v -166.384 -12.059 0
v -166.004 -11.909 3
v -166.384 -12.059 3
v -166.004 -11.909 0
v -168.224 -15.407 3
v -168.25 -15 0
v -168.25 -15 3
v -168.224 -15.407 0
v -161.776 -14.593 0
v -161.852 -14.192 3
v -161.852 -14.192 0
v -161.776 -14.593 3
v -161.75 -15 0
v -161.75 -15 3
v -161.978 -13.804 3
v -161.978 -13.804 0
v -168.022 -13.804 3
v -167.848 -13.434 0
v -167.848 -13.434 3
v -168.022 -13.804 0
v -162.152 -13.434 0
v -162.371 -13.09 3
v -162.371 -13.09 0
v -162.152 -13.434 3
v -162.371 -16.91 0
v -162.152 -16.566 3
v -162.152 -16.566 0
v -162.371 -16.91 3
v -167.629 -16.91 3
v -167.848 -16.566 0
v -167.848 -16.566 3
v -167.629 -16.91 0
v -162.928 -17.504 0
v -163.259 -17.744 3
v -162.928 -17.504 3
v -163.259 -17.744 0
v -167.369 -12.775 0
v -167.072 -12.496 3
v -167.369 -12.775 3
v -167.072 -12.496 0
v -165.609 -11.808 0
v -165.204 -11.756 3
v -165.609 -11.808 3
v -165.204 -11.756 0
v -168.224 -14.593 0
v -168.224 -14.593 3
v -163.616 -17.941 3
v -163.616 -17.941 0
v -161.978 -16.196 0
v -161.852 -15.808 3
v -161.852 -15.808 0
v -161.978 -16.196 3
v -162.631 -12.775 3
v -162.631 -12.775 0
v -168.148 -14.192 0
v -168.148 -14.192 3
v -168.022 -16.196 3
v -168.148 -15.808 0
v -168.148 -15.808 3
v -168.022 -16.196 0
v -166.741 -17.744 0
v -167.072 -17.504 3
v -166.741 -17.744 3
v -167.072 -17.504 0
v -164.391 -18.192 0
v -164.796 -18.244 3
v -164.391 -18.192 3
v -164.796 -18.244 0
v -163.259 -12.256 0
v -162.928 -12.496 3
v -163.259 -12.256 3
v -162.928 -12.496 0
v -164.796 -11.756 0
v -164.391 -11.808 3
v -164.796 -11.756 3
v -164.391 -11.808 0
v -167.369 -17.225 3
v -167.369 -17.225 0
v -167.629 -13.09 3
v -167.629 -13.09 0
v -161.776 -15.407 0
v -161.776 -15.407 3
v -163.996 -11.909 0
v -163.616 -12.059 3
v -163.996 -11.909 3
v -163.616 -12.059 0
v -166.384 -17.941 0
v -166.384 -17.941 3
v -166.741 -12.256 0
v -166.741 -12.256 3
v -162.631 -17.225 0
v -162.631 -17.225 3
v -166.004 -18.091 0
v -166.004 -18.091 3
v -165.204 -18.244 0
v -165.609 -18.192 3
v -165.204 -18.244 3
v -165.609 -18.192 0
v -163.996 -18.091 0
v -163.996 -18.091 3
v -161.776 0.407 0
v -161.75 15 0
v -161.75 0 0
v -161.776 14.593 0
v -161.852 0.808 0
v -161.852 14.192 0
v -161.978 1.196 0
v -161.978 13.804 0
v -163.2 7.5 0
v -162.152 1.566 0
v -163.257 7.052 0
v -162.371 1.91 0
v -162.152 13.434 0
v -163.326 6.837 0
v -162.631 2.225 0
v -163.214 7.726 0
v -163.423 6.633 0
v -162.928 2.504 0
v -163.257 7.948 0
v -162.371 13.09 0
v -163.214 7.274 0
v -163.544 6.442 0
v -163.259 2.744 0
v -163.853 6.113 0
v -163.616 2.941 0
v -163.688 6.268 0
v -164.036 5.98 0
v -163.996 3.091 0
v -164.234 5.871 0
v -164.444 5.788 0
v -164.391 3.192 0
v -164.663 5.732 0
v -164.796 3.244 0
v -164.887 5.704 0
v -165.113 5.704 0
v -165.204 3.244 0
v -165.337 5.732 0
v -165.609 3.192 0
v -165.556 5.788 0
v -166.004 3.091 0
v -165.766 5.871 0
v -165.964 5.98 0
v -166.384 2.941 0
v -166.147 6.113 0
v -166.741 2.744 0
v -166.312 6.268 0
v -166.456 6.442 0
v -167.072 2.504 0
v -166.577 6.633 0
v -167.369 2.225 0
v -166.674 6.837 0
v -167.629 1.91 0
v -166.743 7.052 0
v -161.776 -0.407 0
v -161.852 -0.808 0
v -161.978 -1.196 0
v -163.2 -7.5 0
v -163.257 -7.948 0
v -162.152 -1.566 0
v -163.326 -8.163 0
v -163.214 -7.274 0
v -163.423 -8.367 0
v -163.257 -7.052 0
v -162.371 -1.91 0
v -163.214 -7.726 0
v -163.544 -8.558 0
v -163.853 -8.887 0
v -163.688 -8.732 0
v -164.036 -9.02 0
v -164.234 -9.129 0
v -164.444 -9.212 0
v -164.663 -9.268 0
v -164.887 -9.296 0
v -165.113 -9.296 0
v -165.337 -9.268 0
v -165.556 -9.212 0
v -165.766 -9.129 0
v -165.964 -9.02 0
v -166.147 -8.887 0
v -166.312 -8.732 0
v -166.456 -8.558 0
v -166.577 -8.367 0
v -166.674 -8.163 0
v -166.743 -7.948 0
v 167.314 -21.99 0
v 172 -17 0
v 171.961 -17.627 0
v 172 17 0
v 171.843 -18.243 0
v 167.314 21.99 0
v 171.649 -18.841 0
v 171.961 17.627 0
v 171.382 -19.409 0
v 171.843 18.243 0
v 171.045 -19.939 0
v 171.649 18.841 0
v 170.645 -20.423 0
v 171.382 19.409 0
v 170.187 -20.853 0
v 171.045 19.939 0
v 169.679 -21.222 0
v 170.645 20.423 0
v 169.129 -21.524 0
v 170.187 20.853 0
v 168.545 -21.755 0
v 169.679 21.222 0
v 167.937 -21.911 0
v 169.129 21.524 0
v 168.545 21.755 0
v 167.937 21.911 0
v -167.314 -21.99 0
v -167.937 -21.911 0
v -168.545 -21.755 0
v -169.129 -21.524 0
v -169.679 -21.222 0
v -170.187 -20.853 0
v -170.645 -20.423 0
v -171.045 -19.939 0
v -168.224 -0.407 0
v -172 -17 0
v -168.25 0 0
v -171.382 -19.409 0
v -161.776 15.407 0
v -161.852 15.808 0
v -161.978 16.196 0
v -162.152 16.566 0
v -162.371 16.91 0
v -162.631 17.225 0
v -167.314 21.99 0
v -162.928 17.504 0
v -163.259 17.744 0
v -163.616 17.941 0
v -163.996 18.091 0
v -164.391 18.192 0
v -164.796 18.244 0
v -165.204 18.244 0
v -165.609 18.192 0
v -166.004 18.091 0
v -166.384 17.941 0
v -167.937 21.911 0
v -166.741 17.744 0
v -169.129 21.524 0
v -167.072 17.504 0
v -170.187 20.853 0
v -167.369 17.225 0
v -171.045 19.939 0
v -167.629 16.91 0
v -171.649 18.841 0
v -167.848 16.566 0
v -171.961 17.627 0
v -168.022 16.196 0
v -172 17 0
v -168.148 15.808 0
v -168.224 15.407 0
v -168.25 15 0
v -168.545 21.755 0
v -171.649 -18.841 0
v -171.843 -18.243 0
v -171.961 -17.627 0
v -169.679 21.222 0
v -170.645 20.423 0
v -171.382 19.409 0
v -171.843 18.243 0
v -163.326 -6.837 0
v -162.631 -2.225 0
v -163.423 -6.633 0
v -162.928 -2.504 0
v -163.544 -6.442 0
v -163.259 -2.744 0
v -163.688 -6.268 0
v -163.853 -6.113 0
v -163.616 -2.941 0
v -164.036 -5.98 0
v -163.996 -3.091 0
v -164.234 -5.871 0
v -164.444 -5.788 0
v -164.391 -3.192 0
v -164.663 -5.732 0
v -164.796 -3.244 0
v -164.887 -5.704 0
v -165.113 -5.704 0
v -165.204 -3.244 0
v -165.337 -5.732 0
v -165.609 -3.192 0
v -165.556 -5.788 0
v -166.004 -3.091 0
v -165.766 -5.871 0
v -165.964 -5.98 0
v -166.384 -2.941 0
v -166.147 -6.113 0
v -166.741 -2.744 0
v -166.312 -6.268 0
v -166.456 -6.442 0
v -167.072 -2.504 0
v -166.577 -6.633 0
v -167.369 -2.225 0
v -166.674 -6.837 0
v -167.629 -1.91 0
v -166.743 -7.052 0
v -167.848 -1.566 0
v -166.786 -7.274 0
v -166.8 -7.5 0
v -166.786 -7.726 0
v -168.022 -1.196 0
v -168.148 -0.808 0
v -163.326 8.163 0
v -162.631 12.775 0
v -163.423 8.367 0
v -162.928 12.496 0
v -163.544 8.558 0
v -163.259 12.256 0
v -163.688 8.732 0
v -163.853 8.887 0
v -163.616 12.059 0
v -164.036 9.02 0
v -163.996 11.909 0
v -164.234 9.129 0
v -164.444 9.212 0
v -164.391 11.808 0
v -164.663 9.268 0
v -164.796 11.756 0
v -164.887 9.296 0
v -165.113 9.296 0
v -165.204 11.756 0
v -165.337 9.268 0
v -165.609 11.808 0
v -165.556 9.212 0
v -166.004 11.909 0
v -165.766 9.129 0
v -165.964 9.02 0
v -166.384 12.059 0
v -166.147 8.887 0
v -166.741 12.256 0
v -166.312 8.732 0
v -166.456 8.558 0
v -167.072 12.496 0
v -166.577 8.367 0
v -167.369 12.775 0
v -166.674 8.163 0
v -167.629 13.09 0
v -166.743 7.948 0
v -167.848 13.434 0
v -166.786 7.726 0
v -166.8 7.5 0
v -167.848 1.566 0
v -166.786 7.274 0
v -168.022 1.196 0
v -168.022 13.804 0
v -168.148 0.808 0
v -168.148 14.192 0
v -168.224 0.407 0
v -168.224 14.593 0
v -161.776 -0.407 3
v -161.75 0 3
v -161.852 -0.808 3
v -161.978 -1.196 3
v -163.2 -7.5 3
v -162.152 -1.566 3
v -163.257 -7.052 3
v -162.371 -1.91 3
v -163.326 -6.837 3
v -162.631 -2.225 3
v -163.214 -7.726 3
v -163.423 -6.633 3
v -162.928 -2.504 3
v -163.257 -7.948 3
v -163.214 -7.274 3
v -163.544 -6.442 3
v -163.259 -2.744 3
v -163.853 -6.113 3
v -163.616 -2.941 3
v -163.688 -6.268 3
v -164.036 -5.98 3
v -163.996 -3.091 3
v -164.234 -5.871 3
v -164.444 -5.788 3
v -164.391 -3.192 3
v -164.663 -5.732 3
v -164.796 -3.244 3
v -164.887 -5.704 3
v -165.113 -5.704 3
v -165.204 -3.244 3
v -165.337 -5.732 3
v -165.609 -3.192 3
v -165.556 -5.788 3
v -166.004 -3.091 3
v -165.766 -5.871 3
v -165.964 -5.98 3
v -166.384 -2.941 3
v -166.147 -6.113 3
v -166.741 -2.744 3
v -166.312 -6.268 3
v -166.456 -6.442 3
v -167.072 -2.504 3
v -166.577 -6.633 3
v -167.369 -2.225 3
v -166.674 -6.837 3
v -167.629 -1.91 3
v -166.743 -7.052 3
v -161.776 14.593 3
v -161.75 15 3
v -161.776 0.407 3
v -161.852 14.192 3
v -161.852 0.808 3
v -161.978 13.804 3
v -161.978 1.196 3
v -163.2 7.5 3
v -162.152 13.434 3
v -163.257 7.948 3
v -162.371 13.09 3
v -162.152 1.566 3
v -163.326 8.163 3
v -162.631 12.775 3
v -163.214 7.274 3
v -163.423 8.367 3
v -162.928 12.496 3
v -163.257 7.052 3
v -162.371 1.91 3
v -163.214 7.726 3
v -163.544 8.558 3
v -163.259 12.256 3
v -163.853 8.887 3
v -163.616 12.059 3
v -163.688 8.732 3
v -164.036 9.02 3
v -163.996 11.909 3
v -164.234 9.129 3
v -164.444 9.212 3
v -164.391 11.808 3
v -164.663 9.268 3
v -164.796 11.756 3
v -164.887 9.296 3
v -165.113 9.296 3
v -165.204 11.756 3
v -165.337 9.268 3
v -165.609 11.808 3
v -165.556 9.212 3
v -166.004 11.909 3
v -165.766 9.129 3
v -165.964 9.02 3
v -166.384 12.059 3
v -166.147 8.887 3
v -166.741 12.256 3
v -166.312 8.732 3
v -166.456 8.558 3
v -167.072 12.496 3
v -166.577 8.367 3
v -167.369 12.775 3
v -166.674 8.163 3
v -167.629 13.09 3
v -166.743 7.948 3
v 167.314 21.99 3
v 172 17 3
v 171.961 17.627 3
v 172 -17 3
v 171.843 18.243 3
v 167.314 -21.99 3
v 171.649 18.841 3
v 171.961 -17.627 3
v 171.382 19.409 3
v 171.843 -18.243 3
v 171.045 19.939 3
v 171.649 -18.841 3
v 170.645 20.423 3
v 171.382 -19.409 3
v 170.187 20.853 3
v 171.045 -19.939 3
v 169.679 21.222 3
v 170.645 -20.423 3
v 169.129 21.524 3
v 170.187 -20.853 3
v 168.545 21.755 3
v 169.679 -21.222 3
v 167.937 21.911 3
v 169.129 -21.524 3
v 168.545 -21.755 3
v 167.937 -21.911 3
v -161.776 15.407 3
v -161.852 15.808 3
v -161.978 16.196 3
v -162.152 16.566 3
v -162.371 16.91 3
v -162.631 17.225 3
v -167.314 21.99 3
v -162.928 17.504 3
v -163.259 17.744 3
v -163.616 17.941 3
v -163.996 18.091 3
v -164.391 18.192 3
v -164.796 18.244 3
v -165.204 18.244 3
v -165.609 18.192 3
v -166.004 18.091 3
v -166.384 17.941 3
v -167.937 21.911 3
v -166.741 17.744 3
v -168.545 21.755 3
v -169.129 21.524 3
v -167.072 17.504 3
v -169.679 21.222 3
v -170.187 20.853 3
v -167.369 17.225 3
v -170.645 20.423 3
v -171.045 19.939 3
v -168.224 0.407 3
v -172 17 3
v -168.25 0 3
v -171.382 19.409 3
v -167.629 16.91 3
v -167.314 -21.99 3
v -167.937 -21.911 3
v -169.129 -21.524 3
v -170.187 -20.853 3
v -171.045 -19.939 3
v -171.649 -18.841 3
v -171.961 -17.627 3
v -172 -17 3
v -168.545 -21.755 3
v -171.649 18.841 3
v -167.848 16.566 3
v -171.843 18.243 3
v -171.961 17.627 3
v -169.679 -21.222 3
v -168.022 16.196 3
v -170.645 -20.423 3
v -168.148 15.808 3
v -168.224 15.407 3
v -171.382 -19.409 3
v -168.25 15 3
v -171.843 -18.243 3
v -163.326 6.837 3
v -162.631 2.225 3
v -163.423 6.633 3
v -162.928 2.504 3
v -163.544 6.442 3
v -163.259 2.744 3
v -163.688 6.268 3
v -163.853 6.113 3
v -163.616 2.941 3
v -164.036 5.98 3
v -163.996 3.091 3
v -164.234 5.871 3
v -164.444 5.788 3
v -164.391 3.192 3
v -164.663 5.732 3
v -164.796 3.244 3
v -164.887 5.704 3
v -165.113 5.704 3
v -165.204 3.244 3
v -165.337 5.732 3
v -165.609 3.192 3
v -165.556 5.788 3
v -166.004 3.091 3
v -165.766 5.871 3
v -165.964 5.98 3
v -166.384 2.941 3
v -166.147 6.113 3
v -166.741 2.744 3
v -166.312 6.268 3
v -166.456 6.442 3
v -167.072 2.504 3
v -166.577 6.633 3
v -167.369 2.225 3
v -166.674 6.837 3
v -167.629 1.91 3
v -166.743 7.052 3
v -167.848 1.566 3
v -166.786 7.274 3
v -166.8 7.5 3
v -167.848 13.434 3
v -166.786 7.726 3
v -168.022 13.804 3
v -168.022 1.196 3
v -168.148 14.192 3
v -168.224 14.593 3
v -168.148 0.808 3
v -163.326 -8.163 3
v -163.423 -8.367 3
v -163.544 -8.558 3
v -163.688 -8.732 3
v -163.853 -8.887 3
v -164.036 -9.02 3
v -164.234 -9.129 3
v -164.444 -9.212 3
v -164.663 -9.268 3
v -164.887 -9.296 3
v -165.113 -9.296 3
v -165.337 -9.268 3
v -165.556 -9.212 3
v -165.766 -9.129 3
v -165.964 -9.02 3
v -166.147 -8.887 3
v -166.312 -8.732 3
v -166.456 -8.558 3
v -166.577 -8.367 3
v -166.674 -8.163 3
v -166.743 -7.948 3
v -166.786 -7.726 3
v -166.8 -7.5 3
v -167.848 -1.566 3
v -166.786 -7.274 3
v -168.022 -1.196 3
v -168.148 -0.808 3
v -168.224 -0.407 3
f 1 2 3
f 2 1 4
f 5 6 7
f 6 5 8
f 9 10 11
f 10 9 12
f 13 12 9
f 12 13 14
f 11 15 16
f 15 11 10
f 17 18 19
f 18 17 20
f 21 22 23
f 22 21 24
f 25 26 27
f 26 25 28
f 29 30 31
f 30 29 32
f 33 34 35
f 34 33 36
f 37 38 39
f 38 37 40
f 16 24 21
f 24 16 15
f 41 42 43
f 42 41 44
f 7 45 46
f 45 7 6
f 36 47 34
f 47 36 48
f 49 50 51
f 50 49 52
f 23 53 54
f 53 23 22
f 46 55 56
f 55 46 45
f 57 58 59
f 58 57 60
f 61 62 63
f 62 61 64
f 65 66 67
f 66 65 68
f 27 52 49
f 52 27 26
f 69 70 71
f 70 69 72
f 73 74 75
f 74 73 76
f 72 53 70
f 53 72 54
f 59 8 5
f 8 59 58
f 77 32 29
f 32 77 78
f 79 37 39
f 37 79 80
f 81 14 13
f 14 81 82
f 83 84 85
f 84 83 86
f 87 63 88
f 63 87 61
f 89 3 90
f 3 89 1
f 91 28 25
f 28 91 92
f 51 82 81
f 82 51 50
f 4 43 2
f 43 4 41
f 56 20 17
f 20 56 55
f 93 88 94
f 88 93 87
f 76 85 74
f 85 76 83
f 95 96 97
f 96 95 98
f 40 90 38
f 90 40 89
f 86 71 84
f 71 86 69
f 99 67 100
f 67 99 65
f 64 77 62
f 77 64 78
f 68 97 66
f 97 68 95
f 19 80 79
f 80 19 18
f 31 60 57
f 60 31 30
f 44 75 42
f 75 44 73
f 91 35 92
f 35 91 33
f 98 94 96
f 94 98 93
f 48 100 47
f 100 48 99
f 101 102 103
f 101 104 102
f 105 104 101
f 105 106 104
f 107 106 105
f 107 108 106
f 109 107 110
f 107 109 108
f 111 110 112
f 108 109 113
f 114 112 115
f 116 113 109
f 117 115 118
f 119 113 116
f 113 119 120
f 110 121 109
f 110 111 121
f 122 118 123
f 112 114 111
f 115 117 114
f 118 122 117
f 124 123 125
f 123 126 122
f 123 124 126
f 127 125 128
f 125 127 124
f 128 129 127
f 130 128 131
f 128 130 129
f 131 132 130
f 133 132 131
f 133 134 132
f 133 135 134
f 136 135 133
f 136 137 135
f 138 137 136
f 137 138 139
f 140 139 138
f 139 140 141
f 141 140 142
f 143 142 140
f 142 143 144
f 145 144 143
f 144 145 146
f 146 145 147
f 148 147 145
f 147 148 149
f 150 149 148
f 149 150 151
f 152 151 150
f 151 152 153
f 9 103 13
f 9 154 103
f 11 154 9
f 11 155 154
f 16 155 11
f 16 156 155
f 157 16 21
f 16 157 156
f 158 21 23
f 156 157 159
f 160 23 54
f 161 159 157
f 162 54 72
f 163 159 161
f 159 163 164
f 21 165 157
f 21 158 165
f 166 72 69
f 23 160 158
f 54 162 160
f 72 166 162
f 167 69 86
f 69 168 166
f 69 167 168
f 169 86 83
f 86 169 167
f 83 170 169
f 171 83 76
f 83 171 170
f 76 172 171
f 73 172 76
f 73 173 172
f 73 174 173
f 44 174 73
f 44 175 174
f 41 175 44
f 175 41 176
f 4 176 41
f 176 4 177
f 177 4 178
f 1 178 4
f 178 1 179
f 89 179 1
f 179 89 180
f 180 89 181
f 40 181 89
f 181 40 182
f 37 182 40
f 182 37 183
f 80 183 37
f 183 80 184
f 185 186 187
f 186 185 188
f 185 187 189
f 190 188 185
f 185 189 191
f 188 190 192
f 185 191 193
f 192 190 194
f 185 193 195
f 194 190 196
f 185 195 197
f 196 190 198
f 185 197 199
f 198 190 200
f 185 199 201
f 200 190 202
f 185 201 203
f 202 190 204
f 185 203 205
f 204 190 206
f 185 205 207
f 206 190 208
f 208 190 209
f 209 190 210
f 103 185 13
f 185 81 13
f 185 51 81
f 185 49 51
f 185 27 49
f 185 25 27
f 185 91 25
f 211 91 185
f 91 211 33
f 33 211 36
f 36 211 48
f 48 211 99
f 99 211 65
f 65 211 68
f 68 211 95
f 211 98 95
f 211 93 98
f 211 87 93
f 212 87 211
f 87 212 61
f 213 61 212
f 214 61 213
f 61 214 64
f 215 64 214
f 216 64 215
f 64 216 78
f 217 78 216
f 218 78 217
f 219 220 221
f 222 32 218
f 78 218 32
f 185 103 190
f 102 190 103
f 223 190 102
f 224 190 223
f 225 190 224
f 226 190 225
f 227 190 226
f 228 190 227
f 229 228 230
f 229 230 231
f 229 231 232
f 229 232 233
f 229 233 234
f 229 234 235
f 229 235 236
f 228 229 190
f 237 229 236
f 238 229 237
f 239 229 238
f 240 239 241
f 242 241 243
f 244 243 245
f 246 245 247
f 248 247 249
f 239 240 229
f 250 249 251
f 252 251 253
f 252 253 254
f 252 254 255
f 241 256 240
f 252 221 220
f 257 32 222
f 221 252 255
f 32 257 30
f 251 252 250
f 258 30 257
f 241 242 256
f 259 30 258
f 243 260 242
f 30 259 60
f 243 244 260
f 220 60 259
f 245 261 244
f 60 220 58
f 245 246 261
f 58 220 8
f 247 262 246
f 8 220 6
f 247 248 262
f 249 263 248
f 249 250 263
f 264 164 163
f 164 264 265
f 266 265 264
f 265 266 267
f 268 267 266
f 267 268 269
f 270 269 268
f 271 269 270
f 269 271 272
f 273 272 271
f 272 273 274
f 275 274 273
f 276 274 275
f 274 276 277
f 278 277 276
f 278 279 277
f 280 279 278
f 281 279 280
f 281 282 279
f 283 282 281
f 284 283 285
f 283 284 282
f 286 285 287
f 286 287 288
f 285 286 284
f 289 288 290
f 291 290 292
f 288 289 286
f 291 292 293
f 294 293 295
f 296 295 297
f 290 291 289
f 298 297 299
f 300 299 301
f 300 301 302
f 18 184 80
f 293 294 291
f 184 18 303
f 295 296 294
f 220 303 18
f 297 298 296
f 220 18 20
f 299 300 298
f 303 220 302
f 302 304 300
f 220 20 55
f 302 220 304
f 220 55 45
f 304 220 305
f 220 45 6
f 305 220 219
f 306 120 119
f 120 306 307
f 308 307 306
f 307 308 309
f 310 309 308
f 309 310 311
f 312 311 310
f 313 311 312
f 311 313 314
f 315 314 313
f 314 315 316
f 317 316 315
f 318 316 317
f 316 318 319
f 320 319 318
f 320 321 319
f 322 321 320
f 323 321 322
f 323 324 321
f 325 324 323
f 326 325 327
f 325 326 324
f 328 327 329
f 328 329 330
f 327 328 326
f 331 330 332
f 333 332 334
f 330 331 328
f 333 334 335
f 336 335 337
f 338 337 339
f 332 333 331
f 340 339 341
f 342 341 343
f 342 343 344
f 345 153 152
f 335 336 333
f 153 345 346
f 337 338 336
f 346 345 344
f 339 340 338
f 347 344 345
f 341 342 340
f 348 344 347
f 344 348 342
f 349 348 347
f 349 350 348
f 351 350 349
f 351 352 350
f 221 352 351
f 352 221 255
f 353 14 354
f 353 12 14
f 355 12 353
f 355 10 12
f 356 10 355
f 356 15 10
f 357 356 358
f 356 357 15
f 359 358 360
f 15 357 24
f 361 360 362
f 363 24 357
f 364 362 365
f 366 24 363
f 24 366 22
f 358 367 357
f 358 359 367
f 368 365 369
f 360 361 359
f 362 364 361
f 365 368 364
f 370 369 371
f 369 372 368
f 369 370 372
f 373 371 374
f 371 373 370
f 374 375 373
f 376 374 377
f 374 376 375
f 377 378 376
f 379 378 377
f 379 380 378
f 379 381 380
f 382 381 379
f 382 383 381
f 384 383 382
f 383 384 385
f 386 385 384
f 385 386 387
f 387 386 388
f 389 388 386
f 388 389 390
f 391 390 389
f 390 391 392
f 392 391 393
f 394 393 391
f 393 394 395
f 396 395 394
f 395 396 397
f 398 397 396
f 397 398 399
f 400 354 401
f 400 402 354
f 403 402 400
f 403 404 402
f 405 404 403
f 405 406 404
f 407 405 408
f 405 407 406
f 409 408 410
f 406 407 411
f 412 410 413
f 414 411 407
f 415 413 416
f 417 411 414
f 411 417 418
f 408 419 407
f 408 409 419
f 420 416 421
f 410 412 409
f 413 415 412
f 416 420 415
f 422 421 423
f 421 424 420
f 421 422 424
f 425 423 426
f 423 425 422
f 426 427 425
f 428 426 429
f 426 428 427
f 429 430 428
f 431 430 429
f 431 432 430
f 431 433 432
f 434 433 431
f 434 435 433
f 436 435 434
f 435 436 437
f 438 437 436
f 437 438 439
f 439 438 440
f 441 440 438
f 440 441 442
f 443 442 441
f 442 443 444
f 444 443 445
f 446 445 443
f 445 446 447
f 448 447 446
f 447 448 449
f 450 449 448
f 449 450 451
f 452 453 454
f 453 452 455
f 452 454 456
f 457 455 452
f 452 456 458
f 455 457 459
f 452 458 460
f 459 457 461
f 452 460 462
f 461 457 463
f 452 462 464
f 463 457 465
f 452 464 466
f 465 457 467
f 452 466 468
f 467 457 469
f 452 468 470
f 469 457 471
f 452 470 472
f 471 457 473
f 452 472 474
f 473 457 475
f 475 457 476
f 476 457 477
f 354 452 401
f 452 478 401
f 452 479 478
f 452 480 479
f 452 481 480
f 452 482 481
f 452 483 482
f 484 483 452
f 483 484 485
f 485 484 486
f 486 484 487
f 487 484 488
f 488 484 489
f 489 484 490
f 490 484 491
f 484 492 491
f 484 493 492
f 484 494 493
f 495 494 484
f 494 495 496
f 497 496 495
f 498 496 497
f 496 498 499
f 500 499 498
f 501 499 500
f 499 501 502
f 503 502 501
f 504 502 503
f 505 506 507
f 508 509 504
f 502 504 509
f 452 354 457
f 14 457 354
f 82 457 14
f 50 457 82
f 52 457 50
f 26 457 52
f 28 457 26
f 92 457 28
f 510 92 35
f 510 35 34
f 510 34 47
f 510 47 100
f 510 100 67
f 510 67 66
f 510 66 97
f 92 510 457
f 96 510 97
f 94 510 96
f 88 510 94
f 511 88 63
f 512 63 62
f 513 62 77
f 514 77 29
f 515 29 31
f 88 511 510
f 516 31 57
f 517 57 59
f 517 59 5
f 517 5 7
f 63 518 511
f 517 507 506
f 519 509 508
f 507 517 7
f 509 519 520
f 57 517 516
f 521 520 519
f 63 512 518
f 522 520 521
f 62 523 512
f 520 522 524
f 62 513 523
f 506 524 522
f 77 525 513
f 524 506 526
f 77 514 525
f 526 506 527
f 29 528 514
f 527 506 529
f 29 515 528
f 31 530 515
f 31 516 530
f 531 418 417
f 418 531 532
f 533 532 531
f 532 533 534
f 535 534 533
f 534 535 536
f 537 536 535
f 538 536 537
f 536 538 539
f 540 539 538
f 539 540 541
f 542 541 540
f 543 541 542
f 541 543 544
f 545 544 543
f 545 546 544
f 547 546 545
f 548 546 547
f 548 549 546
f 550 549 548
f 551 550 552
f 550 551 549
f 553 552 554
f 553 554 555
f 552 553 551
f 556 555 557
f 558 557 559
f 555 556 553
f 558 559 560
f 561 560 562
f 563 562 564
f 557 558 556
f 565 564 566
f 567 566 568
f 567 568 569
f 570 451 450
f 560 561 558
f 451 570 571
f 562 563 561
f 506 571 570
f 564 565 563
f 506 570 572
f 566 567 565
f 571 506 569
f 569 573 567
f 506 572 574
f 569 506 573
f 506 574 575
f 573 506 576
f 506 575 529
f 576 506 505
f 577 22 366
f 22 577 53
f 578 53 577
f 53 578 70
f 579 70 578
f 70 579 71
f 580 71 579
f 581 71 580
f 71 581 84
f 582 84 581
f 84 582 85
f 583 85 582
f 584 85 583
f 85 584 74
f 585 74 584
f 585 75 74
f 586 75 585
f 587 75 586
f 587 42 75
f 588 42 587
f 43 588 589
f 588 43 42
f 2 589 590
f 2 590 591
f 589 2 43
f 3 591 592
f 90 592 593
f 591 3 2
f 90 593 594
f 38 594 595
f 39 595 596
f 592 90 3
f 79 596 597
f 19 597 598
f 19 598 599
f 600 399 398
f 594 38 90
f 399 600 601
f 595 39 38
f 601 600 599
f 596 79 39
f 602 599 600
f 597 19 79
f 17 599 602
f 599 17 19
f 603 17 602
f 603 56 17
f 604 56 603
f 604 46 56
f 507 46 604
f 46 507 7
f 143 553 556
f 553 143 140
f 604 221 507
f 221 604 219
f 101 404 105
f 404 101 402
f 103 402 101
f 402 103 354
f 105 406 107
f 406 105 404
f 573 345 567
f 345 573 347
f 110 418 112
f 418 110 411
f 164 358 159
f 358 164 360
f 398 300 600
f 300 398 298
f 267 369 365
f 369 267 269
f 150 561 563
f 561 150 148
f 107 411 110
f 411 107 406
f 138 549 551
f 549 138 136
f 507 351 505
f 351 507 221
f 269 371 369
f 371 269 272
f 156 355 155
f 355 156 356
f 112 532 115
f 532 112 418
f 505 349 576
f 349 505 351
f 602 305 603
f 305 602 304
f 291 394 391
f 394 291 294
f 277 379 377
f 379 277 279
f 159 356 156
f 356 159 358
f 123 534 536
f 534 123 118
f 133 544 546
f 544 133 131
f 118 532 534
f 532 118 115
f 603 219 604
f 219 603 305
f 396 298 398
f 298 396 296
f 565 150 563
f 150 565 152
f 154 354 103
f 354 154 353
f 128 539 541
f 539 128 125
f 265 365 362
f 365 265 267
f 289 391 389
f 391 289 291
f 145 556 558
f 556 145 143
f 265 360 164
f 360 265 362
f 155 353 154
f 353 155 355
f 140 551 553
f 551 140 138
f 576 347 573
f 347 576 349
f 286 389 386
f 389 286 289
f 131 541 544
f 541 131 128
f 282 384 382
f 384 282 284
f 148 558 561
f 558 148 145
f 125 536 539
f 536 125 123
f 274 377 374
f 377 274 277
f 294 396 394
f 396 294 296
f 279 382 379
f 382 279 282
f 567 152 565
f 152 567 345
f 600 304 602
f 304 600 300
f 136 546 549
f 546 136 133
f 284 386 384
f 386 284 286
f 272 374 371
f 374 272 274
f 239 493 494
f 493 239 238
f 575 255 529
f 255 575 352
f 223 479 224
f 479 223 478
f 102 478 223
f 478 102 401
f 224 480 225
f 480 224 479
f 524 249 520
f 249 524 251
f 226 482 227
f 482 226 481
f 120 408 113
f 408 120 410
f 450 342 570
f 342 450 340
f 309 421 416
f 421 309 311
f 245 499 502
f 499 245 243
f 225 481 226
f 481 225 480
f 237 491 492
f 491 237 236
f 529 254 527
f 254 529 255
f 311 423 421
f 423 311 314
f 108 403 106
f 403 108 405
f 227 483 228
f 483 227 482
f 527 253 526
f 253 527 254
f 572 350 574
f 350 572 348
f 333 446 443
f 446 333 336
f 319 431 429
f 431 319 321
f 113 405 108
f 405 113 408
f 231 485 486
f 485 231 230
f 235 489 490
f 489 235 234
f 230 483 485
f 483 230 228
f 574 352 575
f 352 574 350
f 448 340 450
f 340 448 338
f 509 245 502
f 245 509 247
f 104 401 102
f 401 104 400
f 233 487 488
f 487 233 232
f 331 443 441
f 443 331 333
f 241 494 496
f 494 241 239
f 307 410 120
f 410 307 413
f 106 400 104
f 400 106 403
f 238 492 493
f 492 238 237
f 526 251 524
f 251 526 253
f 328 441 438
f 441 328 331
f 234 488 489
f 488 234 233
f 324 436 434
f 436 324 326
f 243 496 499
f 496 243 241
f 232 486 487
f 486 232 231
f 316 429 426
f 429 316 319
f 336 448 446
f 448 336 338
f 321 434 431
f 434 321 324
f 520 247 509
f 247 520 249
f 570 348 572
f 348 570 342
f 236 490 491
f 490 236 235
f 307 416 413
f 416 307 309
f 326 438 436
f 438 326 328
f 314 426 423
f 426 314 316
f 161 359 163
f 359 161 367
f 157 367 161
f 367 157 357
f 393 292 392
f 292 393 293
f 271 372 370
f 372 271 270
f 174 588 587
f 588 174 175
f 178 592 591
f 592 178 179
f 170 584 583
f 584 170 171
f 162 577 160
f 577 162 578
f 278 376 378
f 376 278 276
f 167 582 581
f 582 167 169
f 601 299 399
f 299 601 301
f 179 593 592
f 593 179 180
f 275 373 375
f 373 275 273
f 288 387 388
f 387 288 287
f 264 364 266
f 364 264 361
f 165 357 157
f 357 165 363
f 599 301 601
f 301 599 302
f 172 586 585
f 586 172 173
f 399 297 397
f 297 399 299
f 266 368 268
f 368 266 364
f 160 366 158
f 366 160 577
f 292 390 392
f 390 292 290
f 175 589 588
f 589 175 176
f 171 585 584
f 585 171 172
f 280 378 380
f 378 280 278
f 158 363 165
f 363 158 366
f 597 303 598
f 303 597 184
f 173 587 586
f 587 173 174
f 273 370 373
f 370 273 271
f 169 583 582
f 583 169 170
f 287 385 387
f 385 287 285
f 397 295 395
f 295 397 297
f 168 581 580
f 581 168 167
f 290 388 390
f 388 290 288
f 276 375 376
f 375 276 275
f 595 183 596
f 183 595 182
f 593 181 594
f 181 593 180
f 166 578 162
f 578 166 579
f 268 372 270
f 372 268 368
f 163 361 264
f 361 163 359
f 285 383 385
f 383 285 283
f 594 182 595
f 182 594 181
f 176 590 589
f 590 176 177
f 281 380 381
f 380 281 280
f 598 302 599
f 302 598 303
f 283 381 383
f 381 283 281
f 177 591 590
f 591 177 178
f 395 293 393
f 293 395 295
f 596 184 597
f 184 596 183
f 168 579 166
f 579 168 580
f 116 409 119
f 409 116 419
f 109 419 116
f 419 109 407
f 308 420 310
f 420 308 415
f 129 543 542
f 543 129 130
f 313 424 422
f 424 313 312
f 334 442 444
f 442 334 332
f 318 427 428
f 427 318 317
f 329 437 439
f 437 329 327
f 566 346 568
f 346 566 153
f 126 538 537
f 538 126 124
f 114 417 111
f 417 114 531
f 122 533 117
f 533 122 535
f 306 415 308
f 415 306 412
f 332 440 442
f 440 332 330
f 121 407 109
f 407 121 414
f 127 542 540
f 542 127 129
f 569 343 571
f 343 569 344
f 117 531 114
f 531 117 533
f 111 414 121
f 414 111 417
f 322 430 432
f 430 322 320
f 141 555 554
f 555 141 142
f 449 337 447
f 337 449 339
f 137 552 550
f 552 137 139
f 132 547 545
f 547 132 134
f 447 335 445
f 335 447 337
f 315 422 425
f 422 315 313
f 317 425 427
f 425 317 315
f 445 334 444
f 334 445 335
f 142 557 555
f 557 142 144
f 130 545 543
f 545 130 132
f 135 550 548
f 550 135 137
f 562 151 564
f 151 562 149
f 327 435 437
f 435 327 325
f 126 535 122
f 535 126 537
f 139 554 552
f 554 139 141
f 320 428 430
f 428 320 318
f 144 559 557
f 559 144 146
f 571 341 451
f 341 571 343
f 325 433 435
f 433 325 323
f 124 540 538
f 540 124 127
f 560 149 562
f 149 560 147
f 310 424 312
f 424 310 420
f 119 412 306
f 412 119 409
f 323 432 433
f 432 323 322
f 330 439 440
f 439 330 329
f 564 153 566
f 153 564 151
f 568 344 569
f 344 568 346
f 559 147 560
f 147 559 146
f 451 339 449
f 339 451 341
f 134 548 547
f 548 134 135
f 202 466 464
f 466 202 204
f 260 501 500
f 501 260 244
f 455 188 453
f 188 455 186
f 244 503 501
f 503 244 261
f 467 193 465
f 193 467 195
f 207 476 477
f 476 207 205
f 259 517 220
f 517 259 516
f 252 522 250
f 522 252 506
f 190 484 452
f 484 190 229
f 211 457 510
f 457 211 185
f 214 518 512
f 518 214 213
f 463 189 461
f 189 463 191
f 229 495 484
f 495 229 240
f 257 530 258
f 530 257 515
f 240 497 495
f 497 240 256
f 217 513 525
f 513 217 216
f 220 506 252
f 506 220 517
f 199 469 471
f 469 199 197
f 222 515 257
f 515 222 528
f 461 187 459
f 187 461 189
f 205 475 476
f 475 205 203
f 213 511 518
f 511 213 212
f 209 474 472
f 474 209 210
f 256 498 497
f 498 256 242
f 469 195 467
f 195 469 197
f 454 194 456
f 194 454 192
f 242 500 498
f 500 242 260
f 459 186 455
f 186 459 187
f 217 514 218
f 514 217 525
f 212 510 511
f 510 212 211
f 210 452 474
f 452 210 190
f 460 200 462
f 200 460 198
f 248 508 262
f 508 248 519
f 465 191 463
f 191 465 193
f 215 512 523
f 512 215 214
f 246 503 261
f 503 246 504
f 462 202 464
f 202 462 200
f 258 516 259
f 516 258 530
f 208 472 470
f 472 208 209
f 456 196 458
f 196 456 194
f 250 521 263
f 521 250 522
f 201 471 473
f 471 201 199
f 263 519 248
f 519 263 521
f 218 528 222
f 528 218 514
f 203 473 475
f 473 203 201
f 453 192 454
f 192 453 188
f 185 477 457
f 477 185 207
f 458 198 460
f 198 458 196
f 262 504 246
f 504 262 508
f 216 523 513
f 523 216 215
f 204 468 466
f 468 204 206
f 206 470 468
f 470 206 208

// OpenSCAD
$fn = 50;


difference() {
	union() {
		hull() {
			translate(v = [-167.0000000000, 17.0000000000, 0]) {
				cylinder(h = 3, r = 5);
			}
			translate(v = [167.0000000000, 17.0000000000, 0]) {
				cylinder(h = 3, r = 5);
			}
			translate(v = [-167.0000000000, -17.0000000000, 0]) {
				cylinder(h = 3, r = 5);
			}
			translate(v = [167.0000000000, -17.0000000000, 0]) {
				cylinder(h = 3, r = 5);
			}
		}
	}
	union() {
		translate(v = [-165.0000000000, -15.0000000000, 0]) {
			cylinder(h = 3, r = 3.2500000000);
		}
		translate(v = [-165.0000000000, 0.0000000000, 0]) {
			cylinder(h = 3, r = 3.2500000000);
		}
		translate(v = [-165.0000000000, 15.0000000000, 0]) {
			cylinder(h = 3, r = 3.2500000000);
		}
		translate(v = [-165.0000000000, -15.0000000000, 0]) {
			cylinder(h = 3, r = 1.8000000000);
		}
		translate(v = [-165.0000000000, -7.5000000000, 0]) {
			cylinder(h = 3, r = 1.8000000000);
		}
		translate(v = [-165.0000000000, 0.0000000000, 0]) {
			cylinder(h = 3, r = 1.8000000000);
		}
		translate(v = [-165.0000000000, 7.5000000000, 0]) {
			cylinder(h = 3, r = 1.8000000000);
		}
		translate(v = [-165.0000000000, 15.0000000000, 0]) {
			cylinder(h = 3, r = 1.8000000000);
		}
		translate(v = [-165.0000000000, -15.0000000000, 0]) {
			cylinder(h = 3, r = 1.8000000000);
		}
		translate(v = [-165.0000000000, -7.5000000000, 0]) {
			cylinder(h = 3, r = 1.8000000000);
		}
		translate(v = [-165.0000000000, 0.0000000000, 0]) {
			cylinder(h = 3, r = 1.8000000000);
		}
		translate(v = [-165.0000000000, 7.5000000000, 0]) {
			cylinder(h = 3, r = 1.8000000000);
		}
		translate(v = [-165.0000000000, 15.0000000000, 0]) {
			cylinder(h = 3, r = 1.8000000000);
		}
		translate(v = [-165.0000000000, -15.0000000000, 0]) {
			cylinder(h = 3, r = 1.8000000000);
		}
		translate(v = [-165.0000000000, -7.5000000000, 0]) {
			cylinder(h = 3, r = 1.8000000000);
		}
		translate(v = [-165.0000000000, 0.0000000000, 0]) {
			cylinder(h = 3, r = 1.8000000000);
		}
		translate(v = [-165.0000000000, 7.5000000000, 0]) {
			cylinder(h = 3, r = 1.8000000000);
		}
		translate(v = [-165.0000000000, 15.0000000000, 0]) {
			cylinder(h = 3, r = 1.8000000000);
		}
	}
}
